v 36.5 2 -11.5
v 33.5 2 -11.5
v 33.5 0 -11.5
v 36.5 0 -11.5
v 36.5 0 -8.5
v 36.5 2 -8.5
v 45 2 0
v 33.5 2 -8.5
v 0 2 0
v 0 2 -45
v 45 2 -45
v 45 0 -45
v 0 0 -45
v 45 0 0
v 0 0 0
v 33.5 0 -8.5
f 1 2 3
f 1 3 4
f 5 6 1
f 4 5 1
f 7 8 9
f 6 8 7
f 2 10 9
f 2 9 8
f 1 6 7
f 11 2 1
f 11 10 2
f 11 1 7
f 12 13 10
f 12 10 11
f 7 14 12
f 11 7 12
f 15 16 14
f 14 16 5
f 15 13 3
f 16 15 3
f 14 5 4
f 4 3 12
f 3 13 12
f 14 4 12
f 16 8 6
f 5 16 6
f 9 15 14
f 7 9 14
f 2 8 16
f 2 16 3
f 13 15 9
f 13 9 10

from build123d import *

# Parameters (mm, degrees)
CROQUIS1_W              = 45
CROQUIS1_H              = 45
SALIENTE_EXTRUIR1_DEPTH = 2
CROQUIS2_W              = 3
CROQUIS2_H              = 3
CORTAR_EXTRUIR1_DEPTH   = 5


with BuildPart() as part:
    # Croquis1 → Saliente-Extruir1 (new body)
    with BuildSketch(Plane(origin=(0, 0, 0), x_dir=(1, 0, 0), z_dir=(0, 1, 0))):
        with Locations((22.5, 22.5)):
            Rectangle(CROQUIS1_W, CROQUIS1_H)
    extrude(amount=SALIENTE_EXTRUIR1_DEPTH)

    # Croquis2 → Cortar-Extruir1 (cut)
    with BuildSketch(Plane(origin=(0, 2, 0), x_dir=(1, 0, 0), z_dir=(0, 1, 0))):
        with Locations((35, 10)):
            Rectangle(CROQUIS2_W, CROQUIS2_H)
    extrude(amount=-CORTAR_EXTRUIR1_DEPTH, mode=Mode.SUBTRACT)


solid = part.part
